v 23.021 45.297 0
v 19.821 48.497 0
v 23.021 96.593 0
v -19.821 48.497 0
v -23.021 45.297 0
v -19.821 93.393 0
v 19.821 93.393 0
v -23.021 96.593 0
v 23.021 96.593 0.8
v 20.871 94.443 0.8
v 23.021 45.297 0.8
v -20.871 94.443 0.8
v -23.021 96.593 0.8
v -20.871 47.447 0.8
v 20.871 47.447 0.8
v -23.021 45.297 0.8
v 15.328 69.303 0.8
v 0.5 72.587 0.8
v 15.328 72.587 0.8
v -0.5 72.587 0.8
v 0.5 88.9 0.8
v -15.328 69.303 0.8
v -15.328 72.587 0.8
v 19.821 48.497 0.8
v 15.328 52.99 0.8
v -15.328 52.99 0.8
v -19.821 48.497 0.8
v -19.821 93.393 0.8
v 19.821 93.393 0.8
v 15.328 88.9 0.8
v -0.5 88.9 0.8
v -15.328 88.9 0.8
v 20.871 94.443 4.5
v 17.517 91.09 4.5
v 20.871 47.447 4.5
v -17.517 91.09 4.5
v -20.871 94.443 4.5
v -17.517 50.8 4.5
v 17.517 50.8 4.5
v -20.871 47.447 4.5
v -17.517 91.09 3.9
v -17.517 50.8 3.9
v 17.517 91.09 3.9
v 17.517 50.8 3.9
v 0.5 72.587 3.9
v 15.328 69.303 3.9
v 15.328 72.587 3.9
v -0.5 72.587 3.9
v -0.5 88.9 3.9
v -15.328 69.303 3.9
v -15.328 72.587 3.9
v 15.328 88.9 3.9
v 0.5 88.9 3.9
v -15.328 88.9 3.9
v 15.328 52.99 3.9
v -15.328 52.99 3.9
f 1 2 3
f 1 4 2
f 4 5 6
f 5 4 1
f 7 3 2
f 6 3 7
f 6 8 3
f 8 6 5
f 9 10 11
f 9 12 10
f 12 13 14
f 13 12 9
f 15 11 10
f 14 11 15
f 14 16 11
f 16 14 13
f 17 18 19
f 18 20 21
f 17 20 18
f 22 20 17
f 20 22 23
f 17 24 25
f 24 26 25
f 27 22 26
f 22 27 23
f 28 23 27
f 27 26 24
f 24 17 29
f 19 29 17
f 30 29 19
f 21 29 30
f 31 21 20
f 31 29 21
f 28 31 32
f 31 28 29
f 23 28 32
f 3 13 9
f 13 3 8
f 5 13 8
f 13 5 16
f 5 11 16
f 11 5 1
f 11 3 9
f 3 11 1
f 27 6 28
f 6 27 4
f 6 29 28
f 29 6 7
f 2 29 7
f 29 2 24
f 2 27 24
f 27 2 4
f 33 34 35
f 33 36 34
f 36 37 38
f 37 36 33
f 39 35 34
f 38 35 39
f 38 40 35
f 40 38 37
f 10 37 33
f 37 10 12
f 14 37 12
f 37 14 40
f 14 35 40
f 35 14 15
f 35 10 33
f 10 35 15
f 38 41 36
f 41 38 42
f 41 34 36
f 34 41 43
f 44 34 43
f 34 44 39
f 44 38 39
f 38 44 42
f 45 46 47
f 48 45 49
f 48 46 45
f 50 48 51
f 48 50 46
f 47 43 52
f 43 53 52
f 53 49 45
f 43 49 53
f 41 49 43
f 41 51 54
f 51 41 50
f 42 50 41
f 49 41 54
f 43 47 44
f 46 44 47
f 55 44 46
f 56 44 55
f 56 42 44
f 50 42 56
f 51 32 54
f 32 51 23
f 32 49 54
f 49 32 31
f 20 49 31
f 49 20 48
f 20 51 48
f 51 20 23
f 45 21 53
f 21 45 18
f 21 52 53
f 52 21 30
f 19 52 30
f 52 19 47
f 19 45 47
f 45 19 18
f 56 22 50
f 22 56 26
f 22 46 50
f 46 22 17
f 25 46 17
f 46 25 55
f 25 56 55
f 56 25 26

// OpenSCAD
// file: ../janesville_common.scad
// =====================================================================
//  CMSP Janesville WI Station - shared settings and footprint
//  Frost & Granger, 1902 as-built prints.  G scale 1:29.  Units: model mm.
//  Every other .scad file in this project does:  include <../janesville_common.scad>
// =====================================================================

// ---------- scale ----------
SCALE = 29;
function ft(f, i = 0) = (f * 12 + i) * 25.4 / SCALE;   // real feet + inches -> model mm

// ---------- printer ----------
// "P1S"  = Bambu Lab P1S, 256 x 256 x 256 bed  (use 252 usable)
// "GIGA" = Tom's large-format printer, 800 x 800 x 1000 (use 780 usable)
PRINTER = "P1S";
function bed_for(p) = p == "GIGA" ? [780, 780, 980] : [252, 252, 250];
BED = bed_for(PRINTER);

// ---------- colors (preview only; print color = filament) ----------
PULLMAN_GREEN = "#3B4A2C";   // windows, doors, trim
BRICK_RED     = "#8E3B2C";
MORTAR_WHITE  = "#F2EFE6";
STONE_BUFF    = "#C9B79C";

// ---------- joints between printed sections ----------
PIN_D      = 3.0;    // alignment pin (3 mm PETG filament stub or steel pin)
PIN_CLEAR  = 0.25;   // hole oversize
PIN_DEPTH  = 6;      // hole depth each side of a cut
CUT_BAND   = 5;      // solid band each side of a cut so pins land in plastic

// ---------- NeoPixel wiring ----------
WIRE_CHANNEL = [10, 6];   // width x height of notches in under-floor ribs (3-wire bus)
FEED_HOLE_D  = 8;         // hole up through the floor into each room

// ---------- coordinates ----------
// x runs west -> east along the track.  x = 0 at the west end wall line.
// y = 0 at the main track-side wall line, +y toward town.
// Dimensions are to the MAIN WALL LINE (as the drawings are figured).

// Main building, B2077 / B2076.  Overall 128'-5".
X_WEST_END   = 0;
X_PAV_W      = ft(38, 9);                 // general waiting room wing  38'-9"
X_PAV_E      = X_PAV_W + ft(22, 6);       // center pavilion            22'-6"
X_SMOKE_E    = X_PAV_E + ft(36, 10);      // smoking room wing          36'-10"
X_MAIN_E     = X_SMOKE_E + ft(30, 4);     // lunch room wing            30'-4"  -> 128'-5"
MAIN_DEPTH   = ft(32, 0);                 // west wing, pavilion, smoking wing

// Lunch-room wing is narrower: 25'-4" deep (7'-2" + 11'-0" + 7'-2"),
// set back 1'-5" on the track side and 5'-3" on the town side.  VERIFY vs B2078/B2079.
LUNCH_Y0     = ft(1, 5);
LUNCH_Y1     = LUNCH_Y0 + ft(25, 4);

// Pavilion projections.  APPROXIMATE - verify against elevations.
PORCH_PROJ   = ft(3, 6);    // town side: two 6'-9" blocks project 3'-6"
PORCH_W      = ft(9, 0);    // recessed porch between them (open to y = MAIN_DEPTH)
BAY_PROJ     = ft(3, 0);    // track side: canted ticket-office bay
BAY_W_WALL   = ft(15, 6);   // bay width at the wall
BAY_W_FRONT  = ft(9, 6);    // bay width at its face
BAY_CX       = ft(46, 11);  // bay center from west end (B2077 track-side chain), not centered on the pavilion

// Baggage & express building, B2077: 47'-2" x 25'-4", 42'-0" east of the main building.
// Track wall assumed in line with the lunch wing.  VERIFY.
X_BAG_W      = X_MAIN_E + ft(42, 0);
X_BAG_E      = X_BAG_W + ft(47, 2);
BAG_Y0       = LUNCH_Y0;
BAG_Y1       = BAG_Y0 + ft(25, 4);

// Wall thicknesses (model mm)
T_MAIN  = 6.0;     // main block exterior walls (real 1'-5" = 14.9 mm, thinned for printing)
T_LIGHT = 5.0;     // lunch wing, porch, bay, baggage building

// Heights (B2082 / B2078)
FLOOR_Z      = ft(1, 9);    // finished floor above finished grade
WALL_H       = ft(19, 0);   // floor to cornice, town side
SILL_H       = ft(2, 9);    // floor to top of window sill
BASE_PROJ    = ft(0, 4);    // stone base / water table projects past the wall line

// ---------- footprints (2D) ----------
module footprint_main() {
    union() {
        translate([X_WEST_END, 0]) square([X_SMOKE_E - X_WEST_END, MAIN_DEPTH]);
        translate([X_SMOKE_E, LUNCH_Y0]) square([X_MAIN_E - X_SMOKE_E, LUNCH_Y1 - LUNCH_Y0]);
        // town-side pavilion blocks with the recessed porch between them
        difference() {
            translate([X_PAV_W, MAIN_DEPTH - 0.01]) square([X_PAV_E - X_PAV_W, PORCH_PROJ]);
            translate([(X_PAV_W + X_PAV_E - PORCH_W) / 2, MAIN_DEPTH - 1]) square([PORCH_W, PORCH_PROJ + 2]);
        }
        // track-side canted bay
        let(cx = BAY_CX)
        polygon([[cx - BAY_W_WALL / 2, 0.01], [cx + BAY_W_WALL / 2, 0.01],
                 [cx + BAY_W_FRONT / 2, -BAY_PROJ], [cx - BAY_W_FRONT / 2, -BAY_PROJ]]);
    }
}

module footprint_baggage() {
    translate([X_BAG_W, BAG_Y0]) square([X_BAG_E - X_BAG_W, BAG_Y1 - BAG_Y0]);
}
// main file
// =====================================================================
//  Windows and doors  -  one Pullman-green insert per opening in walls.scad
//  Each insert: a plug that fits the opening (set back 1.5 mm from the brick face),
//  a frame, sash or door leaves with muntins, and a thin flange on the inside face.
//  Glazing: cut clear acetate / PETG sheet to the recess on the inside and glue it in.
//  Printed flat, outside face up.  Openings marked "void" in walls.scad get no insert.
//
//  window_list()  -> ["<wall>|<index>", ...]      window_part(id)   window_place(id)
// =====================================================================
include <../janesville_common.scad>
use <walls.scad>

WIN  = "Main_town|0";   // when opened directly
VIEW = "flat";          // "flat" or "placed"

CLEAR   = 0.15;          // fit clearance per side
REVEAL  = 1.5;           // insert sits this far back from the brick face
FLANGE  = 2.0;           // inside flange, beyond the opening
FLANGE_T = 0.8;          // flange / glazing recess depth
FRAME   = ft(0, 4);      // window/door frame
SASH    = ft(0, 2.5);    // sash stiles and rails
MUNTIN  = 1.0;           // glazing bars (printable minimum)
SASH_SET = 0.6;          // sash face sits back from the frame face
LEAF_SET = 0.9;          // door leaf face sits back from the frame face
GROOVE  = 0.45;          // panel / board grooves
$fn = 64;

// ---------- which openings get inserts ----------
function w_open(name) = wrow(name)[6];
function window_part_name(id) = str("Window_", wid_wall(id), "_", wid_index(id));
function window_list() = [for (n = walls_list()) let(o = w_open(n))
    for (i = [0 : len(o) - 1]) if (len(o) > 0 && o[i][0] != "void") str(n, "|", i)];
function wid_wall(id) = let(p = search("|", id)[0]) substr(id, 0, p);
function wid_index(id) = let(p = search("|", id)[0]) parse_int(substr(id, p + 1));
function substr(s, a, n = -1) = let(e = n < 0 ? len(s) : a + n) str_join([for (i = [a : e - 1]) s[i]]);
function str_join(v, i = 0) = i >= len(v) ? "" : str(v[i], str_join(v, i + 1));
function parse_int(s, i = 0, acc = 0) = i >= len(s) ? acc : parse_int(s, i + 1, acc * 10 + (ord(s[i]) - 48));
function w_style(name) = substr(name, 0, 7) == "Baggage" ? "board" : "panel";

// ---------- 2D shapes, local coords: u = 0 at opening center, v = height above floor (mm) ----------
module open2d(o, d = 0) {       // the opening, grown (+) or shrunk (-) by d
    w = ft(o[2]); b = ft(o[3]); t = ft(o[4]);
    offset(delta = d) {
        translate([-w / 2, b - (b == 0 ? 2 : 0)]) square([w, t - b + (b == 0 ? 2 : 0)]);
        if (o[0] == "arch") translate([0, t]) circle(d = w);
    }
}
module frame2d(o) difference() { open2d(o, -CLEAR); open2d(o, -FRAME); }
module glass2d(o) open2d(o, -FRAME);

// window sash lattice (double-hung; paired with a mullion when wide; arched fanlight)
module sash2d(o) intersection() {
    glass2d(o);
    w = ft(o[2]); b = ft(o[3]); t = ft(o[4]);
    gb = b + FRAME; gt = t - (o[0] == "arch" ? 0 : FRAME);
    pair = o[2] >= 5;
    mid = (gb + gt) / 2;
    union() {
        difference() { glass2d(o); offset(delta = -SASH) glass2d(o); }      // sash perimeter
        translate([-w, mid - SASH * 0.75]) square([2 * w, SASH * 1.5]);       // meeting rail
        if (pair) translate([-FRAME / 2, 0]) square([FRAME, t + w]);          // center mullion
        // upper-sash muntins: two lights per sash
        for (s = pair ? [-1, 1] : [0]) let(cx = s * w / 4)
            translate([cx - MUNTIN / 2, mid]) square([MUNTIN, gt - mid]);
        if (o[0] == "arch") {
            translate([-w, t - FRAME / 2]) square([2 * w, FRAME]);           // transom bar at springing
            translate([0, t]) intersection() {
                translate([-w, 0]) square([2 * w, w]);                               // fanlight only above springing
                union() {
                    for (a = [30 : 30 : 150]) rotate(a) translate([0, -MUNTIN / 2]) square([w, MUNTIN]);
                    difference() { circle(r = w * 0.16 + MUNTIN); circle(r = w * 0.16); }   // fan hub
                }
            }
        }
    }
}

// door leaves: glazed upper panel, two raised lower panels (or vertical boards for baggage doors)
LEAF_TOP = 8;      // ft, top of door leaves; anything above is transom / fanlight
module leaves2d(o) intersection() {
    glass2d(o);
    w = ft(o[2]); lt = min(ft(o[4]) - FRAME, ft(LEAF_TOP));
    translate([-w, -5]) square([2 * w, lt + 5]);
}
module leaf_glass2d(o, style) if (style == "panel") {
    w = ft(o[2]); n = o[2] >= 4.5 ? 2 : 1; lw = (w - 2 * FRAME) / n; lt = min(ft(o[4]) - FRAME, ft(LEAF_TOP));
    for (i = [0 : n - 1]) translate([-w / 2 + FRAME + i * lw + SASH, ft(4)]) square([lw - 2 * SASH, lt - ft(4) - SASH]);
}
module leaf_detail2d(o, style) {           // grooves on the leaf face
    w = ft(o[2]); n = o[2] >= 4.5 ? 2 : 1; lw = (w - 2 * FRAME) / n; lt = min(ft(o[4]) - FRAME, ft(LEAF_TOP));
    if (style == "panel") for (i = [0 : n - 1]) {
        x0 = -w / 2 + FRAME + i * lw;
        translate([x0 - GROOVE / 2 + (i > 0 ? 0 : lw), 0]) square([GROOVE, lt]);               // meeting stile
        for (p = [[ft(0.75), ft(1.75)], [ft(2.1), ft(3.6)]])                                    // two raised panels
            translate([x0 + SASH, p[0]]) difference() {
                square([lw - 2 * SASH, p[1] - p[0]]);
                translate([GROOVE, GROOVE]) square([lw - 2 * SASH - 2 * GROOVE, p[1] - p[0] - 2 * GROOVE]);
            }
    } else {
        for (u = [-w / 2 + ft(0, 6) : ft(0, 6) : w / 2]) translate([u - GROOVE / 2, 0]) square([GROOVE, lt]);   // boards
        translate([-w, ft(2) - GROOVE / 2]) square([2 * w, GROOVE]);                                       // ledgers
        translate([-w, lt - ft(2) - GROOVE / 2]) square([2 * w, GROOVE]);
    }
}
// transom / fanlight above a door
module transom2d(o) {
    w = ft(o[2]); t = ft(o[4]); lt = min(t - FRAME, ft(LEAF_TOP));
    if (t - lt > ft(1)) intersection() {
        glass2d(o);
        difference() {
            translate([-w, lt]) square([2 * w, t + w]);
            translate([0, 0]) offset(delta = -SASH) intersection() { glass2d(o); translate([-w, lt + SASH]) square([2 * w, t + w]); }
        }
    }
    if (o[0] == "arch") translate([0, t]) intersection() {
        circle(d = w - 2 * FRAME);
        union() { for (a = [30 : 30 : 150]) rotate(a) translate([0, -MUNTIN / 2]) square([w, MUNTIN]);
                  translate([-w, -FRAME / 2]) square([2 * w, FRAME]); }
    }
}

// ---------- the insert, flat: inside face at z = 0, outside face up ----------
module window_flat(id, only = -1) {
    n = wid_wall(id); o = w_open(n)[wid_index(id)]; T = wrow(n)[3]; D = T - REVEAL;
    door = o[3] == 0; style = w_style(n);
    module L(k, z0, z1) if (only < 0 || only == k) translate([0, 0, z0]) linear_extrude(z1 - z0) children();
    // flange + glazing recess
    L(0, 0, FLANGE_T) difference() { open2d(o, FLANGE); if (door) leaves2d(o); open2d(o, -1.2);
                                     if (door) translate([-ft(o[2]), -10]) square([2 * ft(o[2]), 10 + 0.01]); }
    // frame, full depth
    L(1, FLANGE_T, D) difference() { frame2d(o); if (door) translate([-ft(o[2]), -10]) square([2 * ft(o[2]), 10]); }
    if (!door) L(2, FLANGE_T, D - SASH_SET) sash2d(o);
    if (door) {
        L(3, 0, D - LEAF_SET - 0.5) difference() { leaves2d(o); leaf_glass2d(o, style); }
        L(4, D - LEAF_SET - 0.5, D - LEAF_SET) difference() { leaves2d(o); leaf_glass2d(o, style); leaf_detail2d(o, style); }
        L(5, FLANGE_T, D - SASH_SET) transom2d(o);
    }
}

module window_part(id) color(PULLMAN_GREEN) window_flat(id);

// glass for pictures and the 3D viewer only (the printed model uses acetate cut to the recess)
module window_glass_flat(id) {
    n = wid_wall(id); o = w_open(n)[wid_index(id)]; T = wrow(n)[3]; D = T - REVEAL; door = o[3] == 0; style = w_style(n);
    if (!door) translate([0, 0, FLANGE_T + 0.4]) linear_extrude(0.3) glass2d(o);
    else {
        translate([0, 0, D - LEAF_SET - 1.0]) linear_extrude(0.3) leaf_glass2d(o, style);
        translate([0, 0, FLANGE_T + 0.4]) linear_extrude(0.3) intersection() { glass2d(o); translate([-ft(20), ft(LEAF_TOP)]) square([ft(40), ft(40)]); }
    }
}
module window_glass_place(id) {
    n = wid_wall(id); r = wrow(n); o = w_open(n)[wid_index(id)]; T = r[3]; org = r[7]; a = r[8];
    off = r[4] ? T : 0;
    translate([org[0], org[1], FLOOR_Z]) rotate([0, 0, a]) translate([off, 0, 0])
        rotate([90, 0, 0]) translate([0, 0, -T]) translate([ft(o[1]) - off, 0, 0]) window_glass_flat(id);
}

// standing in its opening on the building (same transform as wall_place)
module window_place(id) {
    n = wid_wall(id); r = wrow(n); o = w_open(n)[wid_index(id)]; T = r[3]; org = r[7]; a = r[8];
    off = r[4] ? T : 0;
    translate([org[0], org[1], FLOOR_Z]) rotate([0, 0, a]) translate([off, 0, 0])
        rotate([90, 0, 0]) translate([0, 0, -T]) translate([ft(o[1]) - off, 0, 0]) color(PULLMAN_GREEN) window_flat(id);
}

LAYER = -1;   // cloud export helper
if (VIEW == "placed") for (id = window_list()) window_place(id);
else if (LAYER >= 0) window_flat(WIN, LAYER);
else window_part(WIN);
